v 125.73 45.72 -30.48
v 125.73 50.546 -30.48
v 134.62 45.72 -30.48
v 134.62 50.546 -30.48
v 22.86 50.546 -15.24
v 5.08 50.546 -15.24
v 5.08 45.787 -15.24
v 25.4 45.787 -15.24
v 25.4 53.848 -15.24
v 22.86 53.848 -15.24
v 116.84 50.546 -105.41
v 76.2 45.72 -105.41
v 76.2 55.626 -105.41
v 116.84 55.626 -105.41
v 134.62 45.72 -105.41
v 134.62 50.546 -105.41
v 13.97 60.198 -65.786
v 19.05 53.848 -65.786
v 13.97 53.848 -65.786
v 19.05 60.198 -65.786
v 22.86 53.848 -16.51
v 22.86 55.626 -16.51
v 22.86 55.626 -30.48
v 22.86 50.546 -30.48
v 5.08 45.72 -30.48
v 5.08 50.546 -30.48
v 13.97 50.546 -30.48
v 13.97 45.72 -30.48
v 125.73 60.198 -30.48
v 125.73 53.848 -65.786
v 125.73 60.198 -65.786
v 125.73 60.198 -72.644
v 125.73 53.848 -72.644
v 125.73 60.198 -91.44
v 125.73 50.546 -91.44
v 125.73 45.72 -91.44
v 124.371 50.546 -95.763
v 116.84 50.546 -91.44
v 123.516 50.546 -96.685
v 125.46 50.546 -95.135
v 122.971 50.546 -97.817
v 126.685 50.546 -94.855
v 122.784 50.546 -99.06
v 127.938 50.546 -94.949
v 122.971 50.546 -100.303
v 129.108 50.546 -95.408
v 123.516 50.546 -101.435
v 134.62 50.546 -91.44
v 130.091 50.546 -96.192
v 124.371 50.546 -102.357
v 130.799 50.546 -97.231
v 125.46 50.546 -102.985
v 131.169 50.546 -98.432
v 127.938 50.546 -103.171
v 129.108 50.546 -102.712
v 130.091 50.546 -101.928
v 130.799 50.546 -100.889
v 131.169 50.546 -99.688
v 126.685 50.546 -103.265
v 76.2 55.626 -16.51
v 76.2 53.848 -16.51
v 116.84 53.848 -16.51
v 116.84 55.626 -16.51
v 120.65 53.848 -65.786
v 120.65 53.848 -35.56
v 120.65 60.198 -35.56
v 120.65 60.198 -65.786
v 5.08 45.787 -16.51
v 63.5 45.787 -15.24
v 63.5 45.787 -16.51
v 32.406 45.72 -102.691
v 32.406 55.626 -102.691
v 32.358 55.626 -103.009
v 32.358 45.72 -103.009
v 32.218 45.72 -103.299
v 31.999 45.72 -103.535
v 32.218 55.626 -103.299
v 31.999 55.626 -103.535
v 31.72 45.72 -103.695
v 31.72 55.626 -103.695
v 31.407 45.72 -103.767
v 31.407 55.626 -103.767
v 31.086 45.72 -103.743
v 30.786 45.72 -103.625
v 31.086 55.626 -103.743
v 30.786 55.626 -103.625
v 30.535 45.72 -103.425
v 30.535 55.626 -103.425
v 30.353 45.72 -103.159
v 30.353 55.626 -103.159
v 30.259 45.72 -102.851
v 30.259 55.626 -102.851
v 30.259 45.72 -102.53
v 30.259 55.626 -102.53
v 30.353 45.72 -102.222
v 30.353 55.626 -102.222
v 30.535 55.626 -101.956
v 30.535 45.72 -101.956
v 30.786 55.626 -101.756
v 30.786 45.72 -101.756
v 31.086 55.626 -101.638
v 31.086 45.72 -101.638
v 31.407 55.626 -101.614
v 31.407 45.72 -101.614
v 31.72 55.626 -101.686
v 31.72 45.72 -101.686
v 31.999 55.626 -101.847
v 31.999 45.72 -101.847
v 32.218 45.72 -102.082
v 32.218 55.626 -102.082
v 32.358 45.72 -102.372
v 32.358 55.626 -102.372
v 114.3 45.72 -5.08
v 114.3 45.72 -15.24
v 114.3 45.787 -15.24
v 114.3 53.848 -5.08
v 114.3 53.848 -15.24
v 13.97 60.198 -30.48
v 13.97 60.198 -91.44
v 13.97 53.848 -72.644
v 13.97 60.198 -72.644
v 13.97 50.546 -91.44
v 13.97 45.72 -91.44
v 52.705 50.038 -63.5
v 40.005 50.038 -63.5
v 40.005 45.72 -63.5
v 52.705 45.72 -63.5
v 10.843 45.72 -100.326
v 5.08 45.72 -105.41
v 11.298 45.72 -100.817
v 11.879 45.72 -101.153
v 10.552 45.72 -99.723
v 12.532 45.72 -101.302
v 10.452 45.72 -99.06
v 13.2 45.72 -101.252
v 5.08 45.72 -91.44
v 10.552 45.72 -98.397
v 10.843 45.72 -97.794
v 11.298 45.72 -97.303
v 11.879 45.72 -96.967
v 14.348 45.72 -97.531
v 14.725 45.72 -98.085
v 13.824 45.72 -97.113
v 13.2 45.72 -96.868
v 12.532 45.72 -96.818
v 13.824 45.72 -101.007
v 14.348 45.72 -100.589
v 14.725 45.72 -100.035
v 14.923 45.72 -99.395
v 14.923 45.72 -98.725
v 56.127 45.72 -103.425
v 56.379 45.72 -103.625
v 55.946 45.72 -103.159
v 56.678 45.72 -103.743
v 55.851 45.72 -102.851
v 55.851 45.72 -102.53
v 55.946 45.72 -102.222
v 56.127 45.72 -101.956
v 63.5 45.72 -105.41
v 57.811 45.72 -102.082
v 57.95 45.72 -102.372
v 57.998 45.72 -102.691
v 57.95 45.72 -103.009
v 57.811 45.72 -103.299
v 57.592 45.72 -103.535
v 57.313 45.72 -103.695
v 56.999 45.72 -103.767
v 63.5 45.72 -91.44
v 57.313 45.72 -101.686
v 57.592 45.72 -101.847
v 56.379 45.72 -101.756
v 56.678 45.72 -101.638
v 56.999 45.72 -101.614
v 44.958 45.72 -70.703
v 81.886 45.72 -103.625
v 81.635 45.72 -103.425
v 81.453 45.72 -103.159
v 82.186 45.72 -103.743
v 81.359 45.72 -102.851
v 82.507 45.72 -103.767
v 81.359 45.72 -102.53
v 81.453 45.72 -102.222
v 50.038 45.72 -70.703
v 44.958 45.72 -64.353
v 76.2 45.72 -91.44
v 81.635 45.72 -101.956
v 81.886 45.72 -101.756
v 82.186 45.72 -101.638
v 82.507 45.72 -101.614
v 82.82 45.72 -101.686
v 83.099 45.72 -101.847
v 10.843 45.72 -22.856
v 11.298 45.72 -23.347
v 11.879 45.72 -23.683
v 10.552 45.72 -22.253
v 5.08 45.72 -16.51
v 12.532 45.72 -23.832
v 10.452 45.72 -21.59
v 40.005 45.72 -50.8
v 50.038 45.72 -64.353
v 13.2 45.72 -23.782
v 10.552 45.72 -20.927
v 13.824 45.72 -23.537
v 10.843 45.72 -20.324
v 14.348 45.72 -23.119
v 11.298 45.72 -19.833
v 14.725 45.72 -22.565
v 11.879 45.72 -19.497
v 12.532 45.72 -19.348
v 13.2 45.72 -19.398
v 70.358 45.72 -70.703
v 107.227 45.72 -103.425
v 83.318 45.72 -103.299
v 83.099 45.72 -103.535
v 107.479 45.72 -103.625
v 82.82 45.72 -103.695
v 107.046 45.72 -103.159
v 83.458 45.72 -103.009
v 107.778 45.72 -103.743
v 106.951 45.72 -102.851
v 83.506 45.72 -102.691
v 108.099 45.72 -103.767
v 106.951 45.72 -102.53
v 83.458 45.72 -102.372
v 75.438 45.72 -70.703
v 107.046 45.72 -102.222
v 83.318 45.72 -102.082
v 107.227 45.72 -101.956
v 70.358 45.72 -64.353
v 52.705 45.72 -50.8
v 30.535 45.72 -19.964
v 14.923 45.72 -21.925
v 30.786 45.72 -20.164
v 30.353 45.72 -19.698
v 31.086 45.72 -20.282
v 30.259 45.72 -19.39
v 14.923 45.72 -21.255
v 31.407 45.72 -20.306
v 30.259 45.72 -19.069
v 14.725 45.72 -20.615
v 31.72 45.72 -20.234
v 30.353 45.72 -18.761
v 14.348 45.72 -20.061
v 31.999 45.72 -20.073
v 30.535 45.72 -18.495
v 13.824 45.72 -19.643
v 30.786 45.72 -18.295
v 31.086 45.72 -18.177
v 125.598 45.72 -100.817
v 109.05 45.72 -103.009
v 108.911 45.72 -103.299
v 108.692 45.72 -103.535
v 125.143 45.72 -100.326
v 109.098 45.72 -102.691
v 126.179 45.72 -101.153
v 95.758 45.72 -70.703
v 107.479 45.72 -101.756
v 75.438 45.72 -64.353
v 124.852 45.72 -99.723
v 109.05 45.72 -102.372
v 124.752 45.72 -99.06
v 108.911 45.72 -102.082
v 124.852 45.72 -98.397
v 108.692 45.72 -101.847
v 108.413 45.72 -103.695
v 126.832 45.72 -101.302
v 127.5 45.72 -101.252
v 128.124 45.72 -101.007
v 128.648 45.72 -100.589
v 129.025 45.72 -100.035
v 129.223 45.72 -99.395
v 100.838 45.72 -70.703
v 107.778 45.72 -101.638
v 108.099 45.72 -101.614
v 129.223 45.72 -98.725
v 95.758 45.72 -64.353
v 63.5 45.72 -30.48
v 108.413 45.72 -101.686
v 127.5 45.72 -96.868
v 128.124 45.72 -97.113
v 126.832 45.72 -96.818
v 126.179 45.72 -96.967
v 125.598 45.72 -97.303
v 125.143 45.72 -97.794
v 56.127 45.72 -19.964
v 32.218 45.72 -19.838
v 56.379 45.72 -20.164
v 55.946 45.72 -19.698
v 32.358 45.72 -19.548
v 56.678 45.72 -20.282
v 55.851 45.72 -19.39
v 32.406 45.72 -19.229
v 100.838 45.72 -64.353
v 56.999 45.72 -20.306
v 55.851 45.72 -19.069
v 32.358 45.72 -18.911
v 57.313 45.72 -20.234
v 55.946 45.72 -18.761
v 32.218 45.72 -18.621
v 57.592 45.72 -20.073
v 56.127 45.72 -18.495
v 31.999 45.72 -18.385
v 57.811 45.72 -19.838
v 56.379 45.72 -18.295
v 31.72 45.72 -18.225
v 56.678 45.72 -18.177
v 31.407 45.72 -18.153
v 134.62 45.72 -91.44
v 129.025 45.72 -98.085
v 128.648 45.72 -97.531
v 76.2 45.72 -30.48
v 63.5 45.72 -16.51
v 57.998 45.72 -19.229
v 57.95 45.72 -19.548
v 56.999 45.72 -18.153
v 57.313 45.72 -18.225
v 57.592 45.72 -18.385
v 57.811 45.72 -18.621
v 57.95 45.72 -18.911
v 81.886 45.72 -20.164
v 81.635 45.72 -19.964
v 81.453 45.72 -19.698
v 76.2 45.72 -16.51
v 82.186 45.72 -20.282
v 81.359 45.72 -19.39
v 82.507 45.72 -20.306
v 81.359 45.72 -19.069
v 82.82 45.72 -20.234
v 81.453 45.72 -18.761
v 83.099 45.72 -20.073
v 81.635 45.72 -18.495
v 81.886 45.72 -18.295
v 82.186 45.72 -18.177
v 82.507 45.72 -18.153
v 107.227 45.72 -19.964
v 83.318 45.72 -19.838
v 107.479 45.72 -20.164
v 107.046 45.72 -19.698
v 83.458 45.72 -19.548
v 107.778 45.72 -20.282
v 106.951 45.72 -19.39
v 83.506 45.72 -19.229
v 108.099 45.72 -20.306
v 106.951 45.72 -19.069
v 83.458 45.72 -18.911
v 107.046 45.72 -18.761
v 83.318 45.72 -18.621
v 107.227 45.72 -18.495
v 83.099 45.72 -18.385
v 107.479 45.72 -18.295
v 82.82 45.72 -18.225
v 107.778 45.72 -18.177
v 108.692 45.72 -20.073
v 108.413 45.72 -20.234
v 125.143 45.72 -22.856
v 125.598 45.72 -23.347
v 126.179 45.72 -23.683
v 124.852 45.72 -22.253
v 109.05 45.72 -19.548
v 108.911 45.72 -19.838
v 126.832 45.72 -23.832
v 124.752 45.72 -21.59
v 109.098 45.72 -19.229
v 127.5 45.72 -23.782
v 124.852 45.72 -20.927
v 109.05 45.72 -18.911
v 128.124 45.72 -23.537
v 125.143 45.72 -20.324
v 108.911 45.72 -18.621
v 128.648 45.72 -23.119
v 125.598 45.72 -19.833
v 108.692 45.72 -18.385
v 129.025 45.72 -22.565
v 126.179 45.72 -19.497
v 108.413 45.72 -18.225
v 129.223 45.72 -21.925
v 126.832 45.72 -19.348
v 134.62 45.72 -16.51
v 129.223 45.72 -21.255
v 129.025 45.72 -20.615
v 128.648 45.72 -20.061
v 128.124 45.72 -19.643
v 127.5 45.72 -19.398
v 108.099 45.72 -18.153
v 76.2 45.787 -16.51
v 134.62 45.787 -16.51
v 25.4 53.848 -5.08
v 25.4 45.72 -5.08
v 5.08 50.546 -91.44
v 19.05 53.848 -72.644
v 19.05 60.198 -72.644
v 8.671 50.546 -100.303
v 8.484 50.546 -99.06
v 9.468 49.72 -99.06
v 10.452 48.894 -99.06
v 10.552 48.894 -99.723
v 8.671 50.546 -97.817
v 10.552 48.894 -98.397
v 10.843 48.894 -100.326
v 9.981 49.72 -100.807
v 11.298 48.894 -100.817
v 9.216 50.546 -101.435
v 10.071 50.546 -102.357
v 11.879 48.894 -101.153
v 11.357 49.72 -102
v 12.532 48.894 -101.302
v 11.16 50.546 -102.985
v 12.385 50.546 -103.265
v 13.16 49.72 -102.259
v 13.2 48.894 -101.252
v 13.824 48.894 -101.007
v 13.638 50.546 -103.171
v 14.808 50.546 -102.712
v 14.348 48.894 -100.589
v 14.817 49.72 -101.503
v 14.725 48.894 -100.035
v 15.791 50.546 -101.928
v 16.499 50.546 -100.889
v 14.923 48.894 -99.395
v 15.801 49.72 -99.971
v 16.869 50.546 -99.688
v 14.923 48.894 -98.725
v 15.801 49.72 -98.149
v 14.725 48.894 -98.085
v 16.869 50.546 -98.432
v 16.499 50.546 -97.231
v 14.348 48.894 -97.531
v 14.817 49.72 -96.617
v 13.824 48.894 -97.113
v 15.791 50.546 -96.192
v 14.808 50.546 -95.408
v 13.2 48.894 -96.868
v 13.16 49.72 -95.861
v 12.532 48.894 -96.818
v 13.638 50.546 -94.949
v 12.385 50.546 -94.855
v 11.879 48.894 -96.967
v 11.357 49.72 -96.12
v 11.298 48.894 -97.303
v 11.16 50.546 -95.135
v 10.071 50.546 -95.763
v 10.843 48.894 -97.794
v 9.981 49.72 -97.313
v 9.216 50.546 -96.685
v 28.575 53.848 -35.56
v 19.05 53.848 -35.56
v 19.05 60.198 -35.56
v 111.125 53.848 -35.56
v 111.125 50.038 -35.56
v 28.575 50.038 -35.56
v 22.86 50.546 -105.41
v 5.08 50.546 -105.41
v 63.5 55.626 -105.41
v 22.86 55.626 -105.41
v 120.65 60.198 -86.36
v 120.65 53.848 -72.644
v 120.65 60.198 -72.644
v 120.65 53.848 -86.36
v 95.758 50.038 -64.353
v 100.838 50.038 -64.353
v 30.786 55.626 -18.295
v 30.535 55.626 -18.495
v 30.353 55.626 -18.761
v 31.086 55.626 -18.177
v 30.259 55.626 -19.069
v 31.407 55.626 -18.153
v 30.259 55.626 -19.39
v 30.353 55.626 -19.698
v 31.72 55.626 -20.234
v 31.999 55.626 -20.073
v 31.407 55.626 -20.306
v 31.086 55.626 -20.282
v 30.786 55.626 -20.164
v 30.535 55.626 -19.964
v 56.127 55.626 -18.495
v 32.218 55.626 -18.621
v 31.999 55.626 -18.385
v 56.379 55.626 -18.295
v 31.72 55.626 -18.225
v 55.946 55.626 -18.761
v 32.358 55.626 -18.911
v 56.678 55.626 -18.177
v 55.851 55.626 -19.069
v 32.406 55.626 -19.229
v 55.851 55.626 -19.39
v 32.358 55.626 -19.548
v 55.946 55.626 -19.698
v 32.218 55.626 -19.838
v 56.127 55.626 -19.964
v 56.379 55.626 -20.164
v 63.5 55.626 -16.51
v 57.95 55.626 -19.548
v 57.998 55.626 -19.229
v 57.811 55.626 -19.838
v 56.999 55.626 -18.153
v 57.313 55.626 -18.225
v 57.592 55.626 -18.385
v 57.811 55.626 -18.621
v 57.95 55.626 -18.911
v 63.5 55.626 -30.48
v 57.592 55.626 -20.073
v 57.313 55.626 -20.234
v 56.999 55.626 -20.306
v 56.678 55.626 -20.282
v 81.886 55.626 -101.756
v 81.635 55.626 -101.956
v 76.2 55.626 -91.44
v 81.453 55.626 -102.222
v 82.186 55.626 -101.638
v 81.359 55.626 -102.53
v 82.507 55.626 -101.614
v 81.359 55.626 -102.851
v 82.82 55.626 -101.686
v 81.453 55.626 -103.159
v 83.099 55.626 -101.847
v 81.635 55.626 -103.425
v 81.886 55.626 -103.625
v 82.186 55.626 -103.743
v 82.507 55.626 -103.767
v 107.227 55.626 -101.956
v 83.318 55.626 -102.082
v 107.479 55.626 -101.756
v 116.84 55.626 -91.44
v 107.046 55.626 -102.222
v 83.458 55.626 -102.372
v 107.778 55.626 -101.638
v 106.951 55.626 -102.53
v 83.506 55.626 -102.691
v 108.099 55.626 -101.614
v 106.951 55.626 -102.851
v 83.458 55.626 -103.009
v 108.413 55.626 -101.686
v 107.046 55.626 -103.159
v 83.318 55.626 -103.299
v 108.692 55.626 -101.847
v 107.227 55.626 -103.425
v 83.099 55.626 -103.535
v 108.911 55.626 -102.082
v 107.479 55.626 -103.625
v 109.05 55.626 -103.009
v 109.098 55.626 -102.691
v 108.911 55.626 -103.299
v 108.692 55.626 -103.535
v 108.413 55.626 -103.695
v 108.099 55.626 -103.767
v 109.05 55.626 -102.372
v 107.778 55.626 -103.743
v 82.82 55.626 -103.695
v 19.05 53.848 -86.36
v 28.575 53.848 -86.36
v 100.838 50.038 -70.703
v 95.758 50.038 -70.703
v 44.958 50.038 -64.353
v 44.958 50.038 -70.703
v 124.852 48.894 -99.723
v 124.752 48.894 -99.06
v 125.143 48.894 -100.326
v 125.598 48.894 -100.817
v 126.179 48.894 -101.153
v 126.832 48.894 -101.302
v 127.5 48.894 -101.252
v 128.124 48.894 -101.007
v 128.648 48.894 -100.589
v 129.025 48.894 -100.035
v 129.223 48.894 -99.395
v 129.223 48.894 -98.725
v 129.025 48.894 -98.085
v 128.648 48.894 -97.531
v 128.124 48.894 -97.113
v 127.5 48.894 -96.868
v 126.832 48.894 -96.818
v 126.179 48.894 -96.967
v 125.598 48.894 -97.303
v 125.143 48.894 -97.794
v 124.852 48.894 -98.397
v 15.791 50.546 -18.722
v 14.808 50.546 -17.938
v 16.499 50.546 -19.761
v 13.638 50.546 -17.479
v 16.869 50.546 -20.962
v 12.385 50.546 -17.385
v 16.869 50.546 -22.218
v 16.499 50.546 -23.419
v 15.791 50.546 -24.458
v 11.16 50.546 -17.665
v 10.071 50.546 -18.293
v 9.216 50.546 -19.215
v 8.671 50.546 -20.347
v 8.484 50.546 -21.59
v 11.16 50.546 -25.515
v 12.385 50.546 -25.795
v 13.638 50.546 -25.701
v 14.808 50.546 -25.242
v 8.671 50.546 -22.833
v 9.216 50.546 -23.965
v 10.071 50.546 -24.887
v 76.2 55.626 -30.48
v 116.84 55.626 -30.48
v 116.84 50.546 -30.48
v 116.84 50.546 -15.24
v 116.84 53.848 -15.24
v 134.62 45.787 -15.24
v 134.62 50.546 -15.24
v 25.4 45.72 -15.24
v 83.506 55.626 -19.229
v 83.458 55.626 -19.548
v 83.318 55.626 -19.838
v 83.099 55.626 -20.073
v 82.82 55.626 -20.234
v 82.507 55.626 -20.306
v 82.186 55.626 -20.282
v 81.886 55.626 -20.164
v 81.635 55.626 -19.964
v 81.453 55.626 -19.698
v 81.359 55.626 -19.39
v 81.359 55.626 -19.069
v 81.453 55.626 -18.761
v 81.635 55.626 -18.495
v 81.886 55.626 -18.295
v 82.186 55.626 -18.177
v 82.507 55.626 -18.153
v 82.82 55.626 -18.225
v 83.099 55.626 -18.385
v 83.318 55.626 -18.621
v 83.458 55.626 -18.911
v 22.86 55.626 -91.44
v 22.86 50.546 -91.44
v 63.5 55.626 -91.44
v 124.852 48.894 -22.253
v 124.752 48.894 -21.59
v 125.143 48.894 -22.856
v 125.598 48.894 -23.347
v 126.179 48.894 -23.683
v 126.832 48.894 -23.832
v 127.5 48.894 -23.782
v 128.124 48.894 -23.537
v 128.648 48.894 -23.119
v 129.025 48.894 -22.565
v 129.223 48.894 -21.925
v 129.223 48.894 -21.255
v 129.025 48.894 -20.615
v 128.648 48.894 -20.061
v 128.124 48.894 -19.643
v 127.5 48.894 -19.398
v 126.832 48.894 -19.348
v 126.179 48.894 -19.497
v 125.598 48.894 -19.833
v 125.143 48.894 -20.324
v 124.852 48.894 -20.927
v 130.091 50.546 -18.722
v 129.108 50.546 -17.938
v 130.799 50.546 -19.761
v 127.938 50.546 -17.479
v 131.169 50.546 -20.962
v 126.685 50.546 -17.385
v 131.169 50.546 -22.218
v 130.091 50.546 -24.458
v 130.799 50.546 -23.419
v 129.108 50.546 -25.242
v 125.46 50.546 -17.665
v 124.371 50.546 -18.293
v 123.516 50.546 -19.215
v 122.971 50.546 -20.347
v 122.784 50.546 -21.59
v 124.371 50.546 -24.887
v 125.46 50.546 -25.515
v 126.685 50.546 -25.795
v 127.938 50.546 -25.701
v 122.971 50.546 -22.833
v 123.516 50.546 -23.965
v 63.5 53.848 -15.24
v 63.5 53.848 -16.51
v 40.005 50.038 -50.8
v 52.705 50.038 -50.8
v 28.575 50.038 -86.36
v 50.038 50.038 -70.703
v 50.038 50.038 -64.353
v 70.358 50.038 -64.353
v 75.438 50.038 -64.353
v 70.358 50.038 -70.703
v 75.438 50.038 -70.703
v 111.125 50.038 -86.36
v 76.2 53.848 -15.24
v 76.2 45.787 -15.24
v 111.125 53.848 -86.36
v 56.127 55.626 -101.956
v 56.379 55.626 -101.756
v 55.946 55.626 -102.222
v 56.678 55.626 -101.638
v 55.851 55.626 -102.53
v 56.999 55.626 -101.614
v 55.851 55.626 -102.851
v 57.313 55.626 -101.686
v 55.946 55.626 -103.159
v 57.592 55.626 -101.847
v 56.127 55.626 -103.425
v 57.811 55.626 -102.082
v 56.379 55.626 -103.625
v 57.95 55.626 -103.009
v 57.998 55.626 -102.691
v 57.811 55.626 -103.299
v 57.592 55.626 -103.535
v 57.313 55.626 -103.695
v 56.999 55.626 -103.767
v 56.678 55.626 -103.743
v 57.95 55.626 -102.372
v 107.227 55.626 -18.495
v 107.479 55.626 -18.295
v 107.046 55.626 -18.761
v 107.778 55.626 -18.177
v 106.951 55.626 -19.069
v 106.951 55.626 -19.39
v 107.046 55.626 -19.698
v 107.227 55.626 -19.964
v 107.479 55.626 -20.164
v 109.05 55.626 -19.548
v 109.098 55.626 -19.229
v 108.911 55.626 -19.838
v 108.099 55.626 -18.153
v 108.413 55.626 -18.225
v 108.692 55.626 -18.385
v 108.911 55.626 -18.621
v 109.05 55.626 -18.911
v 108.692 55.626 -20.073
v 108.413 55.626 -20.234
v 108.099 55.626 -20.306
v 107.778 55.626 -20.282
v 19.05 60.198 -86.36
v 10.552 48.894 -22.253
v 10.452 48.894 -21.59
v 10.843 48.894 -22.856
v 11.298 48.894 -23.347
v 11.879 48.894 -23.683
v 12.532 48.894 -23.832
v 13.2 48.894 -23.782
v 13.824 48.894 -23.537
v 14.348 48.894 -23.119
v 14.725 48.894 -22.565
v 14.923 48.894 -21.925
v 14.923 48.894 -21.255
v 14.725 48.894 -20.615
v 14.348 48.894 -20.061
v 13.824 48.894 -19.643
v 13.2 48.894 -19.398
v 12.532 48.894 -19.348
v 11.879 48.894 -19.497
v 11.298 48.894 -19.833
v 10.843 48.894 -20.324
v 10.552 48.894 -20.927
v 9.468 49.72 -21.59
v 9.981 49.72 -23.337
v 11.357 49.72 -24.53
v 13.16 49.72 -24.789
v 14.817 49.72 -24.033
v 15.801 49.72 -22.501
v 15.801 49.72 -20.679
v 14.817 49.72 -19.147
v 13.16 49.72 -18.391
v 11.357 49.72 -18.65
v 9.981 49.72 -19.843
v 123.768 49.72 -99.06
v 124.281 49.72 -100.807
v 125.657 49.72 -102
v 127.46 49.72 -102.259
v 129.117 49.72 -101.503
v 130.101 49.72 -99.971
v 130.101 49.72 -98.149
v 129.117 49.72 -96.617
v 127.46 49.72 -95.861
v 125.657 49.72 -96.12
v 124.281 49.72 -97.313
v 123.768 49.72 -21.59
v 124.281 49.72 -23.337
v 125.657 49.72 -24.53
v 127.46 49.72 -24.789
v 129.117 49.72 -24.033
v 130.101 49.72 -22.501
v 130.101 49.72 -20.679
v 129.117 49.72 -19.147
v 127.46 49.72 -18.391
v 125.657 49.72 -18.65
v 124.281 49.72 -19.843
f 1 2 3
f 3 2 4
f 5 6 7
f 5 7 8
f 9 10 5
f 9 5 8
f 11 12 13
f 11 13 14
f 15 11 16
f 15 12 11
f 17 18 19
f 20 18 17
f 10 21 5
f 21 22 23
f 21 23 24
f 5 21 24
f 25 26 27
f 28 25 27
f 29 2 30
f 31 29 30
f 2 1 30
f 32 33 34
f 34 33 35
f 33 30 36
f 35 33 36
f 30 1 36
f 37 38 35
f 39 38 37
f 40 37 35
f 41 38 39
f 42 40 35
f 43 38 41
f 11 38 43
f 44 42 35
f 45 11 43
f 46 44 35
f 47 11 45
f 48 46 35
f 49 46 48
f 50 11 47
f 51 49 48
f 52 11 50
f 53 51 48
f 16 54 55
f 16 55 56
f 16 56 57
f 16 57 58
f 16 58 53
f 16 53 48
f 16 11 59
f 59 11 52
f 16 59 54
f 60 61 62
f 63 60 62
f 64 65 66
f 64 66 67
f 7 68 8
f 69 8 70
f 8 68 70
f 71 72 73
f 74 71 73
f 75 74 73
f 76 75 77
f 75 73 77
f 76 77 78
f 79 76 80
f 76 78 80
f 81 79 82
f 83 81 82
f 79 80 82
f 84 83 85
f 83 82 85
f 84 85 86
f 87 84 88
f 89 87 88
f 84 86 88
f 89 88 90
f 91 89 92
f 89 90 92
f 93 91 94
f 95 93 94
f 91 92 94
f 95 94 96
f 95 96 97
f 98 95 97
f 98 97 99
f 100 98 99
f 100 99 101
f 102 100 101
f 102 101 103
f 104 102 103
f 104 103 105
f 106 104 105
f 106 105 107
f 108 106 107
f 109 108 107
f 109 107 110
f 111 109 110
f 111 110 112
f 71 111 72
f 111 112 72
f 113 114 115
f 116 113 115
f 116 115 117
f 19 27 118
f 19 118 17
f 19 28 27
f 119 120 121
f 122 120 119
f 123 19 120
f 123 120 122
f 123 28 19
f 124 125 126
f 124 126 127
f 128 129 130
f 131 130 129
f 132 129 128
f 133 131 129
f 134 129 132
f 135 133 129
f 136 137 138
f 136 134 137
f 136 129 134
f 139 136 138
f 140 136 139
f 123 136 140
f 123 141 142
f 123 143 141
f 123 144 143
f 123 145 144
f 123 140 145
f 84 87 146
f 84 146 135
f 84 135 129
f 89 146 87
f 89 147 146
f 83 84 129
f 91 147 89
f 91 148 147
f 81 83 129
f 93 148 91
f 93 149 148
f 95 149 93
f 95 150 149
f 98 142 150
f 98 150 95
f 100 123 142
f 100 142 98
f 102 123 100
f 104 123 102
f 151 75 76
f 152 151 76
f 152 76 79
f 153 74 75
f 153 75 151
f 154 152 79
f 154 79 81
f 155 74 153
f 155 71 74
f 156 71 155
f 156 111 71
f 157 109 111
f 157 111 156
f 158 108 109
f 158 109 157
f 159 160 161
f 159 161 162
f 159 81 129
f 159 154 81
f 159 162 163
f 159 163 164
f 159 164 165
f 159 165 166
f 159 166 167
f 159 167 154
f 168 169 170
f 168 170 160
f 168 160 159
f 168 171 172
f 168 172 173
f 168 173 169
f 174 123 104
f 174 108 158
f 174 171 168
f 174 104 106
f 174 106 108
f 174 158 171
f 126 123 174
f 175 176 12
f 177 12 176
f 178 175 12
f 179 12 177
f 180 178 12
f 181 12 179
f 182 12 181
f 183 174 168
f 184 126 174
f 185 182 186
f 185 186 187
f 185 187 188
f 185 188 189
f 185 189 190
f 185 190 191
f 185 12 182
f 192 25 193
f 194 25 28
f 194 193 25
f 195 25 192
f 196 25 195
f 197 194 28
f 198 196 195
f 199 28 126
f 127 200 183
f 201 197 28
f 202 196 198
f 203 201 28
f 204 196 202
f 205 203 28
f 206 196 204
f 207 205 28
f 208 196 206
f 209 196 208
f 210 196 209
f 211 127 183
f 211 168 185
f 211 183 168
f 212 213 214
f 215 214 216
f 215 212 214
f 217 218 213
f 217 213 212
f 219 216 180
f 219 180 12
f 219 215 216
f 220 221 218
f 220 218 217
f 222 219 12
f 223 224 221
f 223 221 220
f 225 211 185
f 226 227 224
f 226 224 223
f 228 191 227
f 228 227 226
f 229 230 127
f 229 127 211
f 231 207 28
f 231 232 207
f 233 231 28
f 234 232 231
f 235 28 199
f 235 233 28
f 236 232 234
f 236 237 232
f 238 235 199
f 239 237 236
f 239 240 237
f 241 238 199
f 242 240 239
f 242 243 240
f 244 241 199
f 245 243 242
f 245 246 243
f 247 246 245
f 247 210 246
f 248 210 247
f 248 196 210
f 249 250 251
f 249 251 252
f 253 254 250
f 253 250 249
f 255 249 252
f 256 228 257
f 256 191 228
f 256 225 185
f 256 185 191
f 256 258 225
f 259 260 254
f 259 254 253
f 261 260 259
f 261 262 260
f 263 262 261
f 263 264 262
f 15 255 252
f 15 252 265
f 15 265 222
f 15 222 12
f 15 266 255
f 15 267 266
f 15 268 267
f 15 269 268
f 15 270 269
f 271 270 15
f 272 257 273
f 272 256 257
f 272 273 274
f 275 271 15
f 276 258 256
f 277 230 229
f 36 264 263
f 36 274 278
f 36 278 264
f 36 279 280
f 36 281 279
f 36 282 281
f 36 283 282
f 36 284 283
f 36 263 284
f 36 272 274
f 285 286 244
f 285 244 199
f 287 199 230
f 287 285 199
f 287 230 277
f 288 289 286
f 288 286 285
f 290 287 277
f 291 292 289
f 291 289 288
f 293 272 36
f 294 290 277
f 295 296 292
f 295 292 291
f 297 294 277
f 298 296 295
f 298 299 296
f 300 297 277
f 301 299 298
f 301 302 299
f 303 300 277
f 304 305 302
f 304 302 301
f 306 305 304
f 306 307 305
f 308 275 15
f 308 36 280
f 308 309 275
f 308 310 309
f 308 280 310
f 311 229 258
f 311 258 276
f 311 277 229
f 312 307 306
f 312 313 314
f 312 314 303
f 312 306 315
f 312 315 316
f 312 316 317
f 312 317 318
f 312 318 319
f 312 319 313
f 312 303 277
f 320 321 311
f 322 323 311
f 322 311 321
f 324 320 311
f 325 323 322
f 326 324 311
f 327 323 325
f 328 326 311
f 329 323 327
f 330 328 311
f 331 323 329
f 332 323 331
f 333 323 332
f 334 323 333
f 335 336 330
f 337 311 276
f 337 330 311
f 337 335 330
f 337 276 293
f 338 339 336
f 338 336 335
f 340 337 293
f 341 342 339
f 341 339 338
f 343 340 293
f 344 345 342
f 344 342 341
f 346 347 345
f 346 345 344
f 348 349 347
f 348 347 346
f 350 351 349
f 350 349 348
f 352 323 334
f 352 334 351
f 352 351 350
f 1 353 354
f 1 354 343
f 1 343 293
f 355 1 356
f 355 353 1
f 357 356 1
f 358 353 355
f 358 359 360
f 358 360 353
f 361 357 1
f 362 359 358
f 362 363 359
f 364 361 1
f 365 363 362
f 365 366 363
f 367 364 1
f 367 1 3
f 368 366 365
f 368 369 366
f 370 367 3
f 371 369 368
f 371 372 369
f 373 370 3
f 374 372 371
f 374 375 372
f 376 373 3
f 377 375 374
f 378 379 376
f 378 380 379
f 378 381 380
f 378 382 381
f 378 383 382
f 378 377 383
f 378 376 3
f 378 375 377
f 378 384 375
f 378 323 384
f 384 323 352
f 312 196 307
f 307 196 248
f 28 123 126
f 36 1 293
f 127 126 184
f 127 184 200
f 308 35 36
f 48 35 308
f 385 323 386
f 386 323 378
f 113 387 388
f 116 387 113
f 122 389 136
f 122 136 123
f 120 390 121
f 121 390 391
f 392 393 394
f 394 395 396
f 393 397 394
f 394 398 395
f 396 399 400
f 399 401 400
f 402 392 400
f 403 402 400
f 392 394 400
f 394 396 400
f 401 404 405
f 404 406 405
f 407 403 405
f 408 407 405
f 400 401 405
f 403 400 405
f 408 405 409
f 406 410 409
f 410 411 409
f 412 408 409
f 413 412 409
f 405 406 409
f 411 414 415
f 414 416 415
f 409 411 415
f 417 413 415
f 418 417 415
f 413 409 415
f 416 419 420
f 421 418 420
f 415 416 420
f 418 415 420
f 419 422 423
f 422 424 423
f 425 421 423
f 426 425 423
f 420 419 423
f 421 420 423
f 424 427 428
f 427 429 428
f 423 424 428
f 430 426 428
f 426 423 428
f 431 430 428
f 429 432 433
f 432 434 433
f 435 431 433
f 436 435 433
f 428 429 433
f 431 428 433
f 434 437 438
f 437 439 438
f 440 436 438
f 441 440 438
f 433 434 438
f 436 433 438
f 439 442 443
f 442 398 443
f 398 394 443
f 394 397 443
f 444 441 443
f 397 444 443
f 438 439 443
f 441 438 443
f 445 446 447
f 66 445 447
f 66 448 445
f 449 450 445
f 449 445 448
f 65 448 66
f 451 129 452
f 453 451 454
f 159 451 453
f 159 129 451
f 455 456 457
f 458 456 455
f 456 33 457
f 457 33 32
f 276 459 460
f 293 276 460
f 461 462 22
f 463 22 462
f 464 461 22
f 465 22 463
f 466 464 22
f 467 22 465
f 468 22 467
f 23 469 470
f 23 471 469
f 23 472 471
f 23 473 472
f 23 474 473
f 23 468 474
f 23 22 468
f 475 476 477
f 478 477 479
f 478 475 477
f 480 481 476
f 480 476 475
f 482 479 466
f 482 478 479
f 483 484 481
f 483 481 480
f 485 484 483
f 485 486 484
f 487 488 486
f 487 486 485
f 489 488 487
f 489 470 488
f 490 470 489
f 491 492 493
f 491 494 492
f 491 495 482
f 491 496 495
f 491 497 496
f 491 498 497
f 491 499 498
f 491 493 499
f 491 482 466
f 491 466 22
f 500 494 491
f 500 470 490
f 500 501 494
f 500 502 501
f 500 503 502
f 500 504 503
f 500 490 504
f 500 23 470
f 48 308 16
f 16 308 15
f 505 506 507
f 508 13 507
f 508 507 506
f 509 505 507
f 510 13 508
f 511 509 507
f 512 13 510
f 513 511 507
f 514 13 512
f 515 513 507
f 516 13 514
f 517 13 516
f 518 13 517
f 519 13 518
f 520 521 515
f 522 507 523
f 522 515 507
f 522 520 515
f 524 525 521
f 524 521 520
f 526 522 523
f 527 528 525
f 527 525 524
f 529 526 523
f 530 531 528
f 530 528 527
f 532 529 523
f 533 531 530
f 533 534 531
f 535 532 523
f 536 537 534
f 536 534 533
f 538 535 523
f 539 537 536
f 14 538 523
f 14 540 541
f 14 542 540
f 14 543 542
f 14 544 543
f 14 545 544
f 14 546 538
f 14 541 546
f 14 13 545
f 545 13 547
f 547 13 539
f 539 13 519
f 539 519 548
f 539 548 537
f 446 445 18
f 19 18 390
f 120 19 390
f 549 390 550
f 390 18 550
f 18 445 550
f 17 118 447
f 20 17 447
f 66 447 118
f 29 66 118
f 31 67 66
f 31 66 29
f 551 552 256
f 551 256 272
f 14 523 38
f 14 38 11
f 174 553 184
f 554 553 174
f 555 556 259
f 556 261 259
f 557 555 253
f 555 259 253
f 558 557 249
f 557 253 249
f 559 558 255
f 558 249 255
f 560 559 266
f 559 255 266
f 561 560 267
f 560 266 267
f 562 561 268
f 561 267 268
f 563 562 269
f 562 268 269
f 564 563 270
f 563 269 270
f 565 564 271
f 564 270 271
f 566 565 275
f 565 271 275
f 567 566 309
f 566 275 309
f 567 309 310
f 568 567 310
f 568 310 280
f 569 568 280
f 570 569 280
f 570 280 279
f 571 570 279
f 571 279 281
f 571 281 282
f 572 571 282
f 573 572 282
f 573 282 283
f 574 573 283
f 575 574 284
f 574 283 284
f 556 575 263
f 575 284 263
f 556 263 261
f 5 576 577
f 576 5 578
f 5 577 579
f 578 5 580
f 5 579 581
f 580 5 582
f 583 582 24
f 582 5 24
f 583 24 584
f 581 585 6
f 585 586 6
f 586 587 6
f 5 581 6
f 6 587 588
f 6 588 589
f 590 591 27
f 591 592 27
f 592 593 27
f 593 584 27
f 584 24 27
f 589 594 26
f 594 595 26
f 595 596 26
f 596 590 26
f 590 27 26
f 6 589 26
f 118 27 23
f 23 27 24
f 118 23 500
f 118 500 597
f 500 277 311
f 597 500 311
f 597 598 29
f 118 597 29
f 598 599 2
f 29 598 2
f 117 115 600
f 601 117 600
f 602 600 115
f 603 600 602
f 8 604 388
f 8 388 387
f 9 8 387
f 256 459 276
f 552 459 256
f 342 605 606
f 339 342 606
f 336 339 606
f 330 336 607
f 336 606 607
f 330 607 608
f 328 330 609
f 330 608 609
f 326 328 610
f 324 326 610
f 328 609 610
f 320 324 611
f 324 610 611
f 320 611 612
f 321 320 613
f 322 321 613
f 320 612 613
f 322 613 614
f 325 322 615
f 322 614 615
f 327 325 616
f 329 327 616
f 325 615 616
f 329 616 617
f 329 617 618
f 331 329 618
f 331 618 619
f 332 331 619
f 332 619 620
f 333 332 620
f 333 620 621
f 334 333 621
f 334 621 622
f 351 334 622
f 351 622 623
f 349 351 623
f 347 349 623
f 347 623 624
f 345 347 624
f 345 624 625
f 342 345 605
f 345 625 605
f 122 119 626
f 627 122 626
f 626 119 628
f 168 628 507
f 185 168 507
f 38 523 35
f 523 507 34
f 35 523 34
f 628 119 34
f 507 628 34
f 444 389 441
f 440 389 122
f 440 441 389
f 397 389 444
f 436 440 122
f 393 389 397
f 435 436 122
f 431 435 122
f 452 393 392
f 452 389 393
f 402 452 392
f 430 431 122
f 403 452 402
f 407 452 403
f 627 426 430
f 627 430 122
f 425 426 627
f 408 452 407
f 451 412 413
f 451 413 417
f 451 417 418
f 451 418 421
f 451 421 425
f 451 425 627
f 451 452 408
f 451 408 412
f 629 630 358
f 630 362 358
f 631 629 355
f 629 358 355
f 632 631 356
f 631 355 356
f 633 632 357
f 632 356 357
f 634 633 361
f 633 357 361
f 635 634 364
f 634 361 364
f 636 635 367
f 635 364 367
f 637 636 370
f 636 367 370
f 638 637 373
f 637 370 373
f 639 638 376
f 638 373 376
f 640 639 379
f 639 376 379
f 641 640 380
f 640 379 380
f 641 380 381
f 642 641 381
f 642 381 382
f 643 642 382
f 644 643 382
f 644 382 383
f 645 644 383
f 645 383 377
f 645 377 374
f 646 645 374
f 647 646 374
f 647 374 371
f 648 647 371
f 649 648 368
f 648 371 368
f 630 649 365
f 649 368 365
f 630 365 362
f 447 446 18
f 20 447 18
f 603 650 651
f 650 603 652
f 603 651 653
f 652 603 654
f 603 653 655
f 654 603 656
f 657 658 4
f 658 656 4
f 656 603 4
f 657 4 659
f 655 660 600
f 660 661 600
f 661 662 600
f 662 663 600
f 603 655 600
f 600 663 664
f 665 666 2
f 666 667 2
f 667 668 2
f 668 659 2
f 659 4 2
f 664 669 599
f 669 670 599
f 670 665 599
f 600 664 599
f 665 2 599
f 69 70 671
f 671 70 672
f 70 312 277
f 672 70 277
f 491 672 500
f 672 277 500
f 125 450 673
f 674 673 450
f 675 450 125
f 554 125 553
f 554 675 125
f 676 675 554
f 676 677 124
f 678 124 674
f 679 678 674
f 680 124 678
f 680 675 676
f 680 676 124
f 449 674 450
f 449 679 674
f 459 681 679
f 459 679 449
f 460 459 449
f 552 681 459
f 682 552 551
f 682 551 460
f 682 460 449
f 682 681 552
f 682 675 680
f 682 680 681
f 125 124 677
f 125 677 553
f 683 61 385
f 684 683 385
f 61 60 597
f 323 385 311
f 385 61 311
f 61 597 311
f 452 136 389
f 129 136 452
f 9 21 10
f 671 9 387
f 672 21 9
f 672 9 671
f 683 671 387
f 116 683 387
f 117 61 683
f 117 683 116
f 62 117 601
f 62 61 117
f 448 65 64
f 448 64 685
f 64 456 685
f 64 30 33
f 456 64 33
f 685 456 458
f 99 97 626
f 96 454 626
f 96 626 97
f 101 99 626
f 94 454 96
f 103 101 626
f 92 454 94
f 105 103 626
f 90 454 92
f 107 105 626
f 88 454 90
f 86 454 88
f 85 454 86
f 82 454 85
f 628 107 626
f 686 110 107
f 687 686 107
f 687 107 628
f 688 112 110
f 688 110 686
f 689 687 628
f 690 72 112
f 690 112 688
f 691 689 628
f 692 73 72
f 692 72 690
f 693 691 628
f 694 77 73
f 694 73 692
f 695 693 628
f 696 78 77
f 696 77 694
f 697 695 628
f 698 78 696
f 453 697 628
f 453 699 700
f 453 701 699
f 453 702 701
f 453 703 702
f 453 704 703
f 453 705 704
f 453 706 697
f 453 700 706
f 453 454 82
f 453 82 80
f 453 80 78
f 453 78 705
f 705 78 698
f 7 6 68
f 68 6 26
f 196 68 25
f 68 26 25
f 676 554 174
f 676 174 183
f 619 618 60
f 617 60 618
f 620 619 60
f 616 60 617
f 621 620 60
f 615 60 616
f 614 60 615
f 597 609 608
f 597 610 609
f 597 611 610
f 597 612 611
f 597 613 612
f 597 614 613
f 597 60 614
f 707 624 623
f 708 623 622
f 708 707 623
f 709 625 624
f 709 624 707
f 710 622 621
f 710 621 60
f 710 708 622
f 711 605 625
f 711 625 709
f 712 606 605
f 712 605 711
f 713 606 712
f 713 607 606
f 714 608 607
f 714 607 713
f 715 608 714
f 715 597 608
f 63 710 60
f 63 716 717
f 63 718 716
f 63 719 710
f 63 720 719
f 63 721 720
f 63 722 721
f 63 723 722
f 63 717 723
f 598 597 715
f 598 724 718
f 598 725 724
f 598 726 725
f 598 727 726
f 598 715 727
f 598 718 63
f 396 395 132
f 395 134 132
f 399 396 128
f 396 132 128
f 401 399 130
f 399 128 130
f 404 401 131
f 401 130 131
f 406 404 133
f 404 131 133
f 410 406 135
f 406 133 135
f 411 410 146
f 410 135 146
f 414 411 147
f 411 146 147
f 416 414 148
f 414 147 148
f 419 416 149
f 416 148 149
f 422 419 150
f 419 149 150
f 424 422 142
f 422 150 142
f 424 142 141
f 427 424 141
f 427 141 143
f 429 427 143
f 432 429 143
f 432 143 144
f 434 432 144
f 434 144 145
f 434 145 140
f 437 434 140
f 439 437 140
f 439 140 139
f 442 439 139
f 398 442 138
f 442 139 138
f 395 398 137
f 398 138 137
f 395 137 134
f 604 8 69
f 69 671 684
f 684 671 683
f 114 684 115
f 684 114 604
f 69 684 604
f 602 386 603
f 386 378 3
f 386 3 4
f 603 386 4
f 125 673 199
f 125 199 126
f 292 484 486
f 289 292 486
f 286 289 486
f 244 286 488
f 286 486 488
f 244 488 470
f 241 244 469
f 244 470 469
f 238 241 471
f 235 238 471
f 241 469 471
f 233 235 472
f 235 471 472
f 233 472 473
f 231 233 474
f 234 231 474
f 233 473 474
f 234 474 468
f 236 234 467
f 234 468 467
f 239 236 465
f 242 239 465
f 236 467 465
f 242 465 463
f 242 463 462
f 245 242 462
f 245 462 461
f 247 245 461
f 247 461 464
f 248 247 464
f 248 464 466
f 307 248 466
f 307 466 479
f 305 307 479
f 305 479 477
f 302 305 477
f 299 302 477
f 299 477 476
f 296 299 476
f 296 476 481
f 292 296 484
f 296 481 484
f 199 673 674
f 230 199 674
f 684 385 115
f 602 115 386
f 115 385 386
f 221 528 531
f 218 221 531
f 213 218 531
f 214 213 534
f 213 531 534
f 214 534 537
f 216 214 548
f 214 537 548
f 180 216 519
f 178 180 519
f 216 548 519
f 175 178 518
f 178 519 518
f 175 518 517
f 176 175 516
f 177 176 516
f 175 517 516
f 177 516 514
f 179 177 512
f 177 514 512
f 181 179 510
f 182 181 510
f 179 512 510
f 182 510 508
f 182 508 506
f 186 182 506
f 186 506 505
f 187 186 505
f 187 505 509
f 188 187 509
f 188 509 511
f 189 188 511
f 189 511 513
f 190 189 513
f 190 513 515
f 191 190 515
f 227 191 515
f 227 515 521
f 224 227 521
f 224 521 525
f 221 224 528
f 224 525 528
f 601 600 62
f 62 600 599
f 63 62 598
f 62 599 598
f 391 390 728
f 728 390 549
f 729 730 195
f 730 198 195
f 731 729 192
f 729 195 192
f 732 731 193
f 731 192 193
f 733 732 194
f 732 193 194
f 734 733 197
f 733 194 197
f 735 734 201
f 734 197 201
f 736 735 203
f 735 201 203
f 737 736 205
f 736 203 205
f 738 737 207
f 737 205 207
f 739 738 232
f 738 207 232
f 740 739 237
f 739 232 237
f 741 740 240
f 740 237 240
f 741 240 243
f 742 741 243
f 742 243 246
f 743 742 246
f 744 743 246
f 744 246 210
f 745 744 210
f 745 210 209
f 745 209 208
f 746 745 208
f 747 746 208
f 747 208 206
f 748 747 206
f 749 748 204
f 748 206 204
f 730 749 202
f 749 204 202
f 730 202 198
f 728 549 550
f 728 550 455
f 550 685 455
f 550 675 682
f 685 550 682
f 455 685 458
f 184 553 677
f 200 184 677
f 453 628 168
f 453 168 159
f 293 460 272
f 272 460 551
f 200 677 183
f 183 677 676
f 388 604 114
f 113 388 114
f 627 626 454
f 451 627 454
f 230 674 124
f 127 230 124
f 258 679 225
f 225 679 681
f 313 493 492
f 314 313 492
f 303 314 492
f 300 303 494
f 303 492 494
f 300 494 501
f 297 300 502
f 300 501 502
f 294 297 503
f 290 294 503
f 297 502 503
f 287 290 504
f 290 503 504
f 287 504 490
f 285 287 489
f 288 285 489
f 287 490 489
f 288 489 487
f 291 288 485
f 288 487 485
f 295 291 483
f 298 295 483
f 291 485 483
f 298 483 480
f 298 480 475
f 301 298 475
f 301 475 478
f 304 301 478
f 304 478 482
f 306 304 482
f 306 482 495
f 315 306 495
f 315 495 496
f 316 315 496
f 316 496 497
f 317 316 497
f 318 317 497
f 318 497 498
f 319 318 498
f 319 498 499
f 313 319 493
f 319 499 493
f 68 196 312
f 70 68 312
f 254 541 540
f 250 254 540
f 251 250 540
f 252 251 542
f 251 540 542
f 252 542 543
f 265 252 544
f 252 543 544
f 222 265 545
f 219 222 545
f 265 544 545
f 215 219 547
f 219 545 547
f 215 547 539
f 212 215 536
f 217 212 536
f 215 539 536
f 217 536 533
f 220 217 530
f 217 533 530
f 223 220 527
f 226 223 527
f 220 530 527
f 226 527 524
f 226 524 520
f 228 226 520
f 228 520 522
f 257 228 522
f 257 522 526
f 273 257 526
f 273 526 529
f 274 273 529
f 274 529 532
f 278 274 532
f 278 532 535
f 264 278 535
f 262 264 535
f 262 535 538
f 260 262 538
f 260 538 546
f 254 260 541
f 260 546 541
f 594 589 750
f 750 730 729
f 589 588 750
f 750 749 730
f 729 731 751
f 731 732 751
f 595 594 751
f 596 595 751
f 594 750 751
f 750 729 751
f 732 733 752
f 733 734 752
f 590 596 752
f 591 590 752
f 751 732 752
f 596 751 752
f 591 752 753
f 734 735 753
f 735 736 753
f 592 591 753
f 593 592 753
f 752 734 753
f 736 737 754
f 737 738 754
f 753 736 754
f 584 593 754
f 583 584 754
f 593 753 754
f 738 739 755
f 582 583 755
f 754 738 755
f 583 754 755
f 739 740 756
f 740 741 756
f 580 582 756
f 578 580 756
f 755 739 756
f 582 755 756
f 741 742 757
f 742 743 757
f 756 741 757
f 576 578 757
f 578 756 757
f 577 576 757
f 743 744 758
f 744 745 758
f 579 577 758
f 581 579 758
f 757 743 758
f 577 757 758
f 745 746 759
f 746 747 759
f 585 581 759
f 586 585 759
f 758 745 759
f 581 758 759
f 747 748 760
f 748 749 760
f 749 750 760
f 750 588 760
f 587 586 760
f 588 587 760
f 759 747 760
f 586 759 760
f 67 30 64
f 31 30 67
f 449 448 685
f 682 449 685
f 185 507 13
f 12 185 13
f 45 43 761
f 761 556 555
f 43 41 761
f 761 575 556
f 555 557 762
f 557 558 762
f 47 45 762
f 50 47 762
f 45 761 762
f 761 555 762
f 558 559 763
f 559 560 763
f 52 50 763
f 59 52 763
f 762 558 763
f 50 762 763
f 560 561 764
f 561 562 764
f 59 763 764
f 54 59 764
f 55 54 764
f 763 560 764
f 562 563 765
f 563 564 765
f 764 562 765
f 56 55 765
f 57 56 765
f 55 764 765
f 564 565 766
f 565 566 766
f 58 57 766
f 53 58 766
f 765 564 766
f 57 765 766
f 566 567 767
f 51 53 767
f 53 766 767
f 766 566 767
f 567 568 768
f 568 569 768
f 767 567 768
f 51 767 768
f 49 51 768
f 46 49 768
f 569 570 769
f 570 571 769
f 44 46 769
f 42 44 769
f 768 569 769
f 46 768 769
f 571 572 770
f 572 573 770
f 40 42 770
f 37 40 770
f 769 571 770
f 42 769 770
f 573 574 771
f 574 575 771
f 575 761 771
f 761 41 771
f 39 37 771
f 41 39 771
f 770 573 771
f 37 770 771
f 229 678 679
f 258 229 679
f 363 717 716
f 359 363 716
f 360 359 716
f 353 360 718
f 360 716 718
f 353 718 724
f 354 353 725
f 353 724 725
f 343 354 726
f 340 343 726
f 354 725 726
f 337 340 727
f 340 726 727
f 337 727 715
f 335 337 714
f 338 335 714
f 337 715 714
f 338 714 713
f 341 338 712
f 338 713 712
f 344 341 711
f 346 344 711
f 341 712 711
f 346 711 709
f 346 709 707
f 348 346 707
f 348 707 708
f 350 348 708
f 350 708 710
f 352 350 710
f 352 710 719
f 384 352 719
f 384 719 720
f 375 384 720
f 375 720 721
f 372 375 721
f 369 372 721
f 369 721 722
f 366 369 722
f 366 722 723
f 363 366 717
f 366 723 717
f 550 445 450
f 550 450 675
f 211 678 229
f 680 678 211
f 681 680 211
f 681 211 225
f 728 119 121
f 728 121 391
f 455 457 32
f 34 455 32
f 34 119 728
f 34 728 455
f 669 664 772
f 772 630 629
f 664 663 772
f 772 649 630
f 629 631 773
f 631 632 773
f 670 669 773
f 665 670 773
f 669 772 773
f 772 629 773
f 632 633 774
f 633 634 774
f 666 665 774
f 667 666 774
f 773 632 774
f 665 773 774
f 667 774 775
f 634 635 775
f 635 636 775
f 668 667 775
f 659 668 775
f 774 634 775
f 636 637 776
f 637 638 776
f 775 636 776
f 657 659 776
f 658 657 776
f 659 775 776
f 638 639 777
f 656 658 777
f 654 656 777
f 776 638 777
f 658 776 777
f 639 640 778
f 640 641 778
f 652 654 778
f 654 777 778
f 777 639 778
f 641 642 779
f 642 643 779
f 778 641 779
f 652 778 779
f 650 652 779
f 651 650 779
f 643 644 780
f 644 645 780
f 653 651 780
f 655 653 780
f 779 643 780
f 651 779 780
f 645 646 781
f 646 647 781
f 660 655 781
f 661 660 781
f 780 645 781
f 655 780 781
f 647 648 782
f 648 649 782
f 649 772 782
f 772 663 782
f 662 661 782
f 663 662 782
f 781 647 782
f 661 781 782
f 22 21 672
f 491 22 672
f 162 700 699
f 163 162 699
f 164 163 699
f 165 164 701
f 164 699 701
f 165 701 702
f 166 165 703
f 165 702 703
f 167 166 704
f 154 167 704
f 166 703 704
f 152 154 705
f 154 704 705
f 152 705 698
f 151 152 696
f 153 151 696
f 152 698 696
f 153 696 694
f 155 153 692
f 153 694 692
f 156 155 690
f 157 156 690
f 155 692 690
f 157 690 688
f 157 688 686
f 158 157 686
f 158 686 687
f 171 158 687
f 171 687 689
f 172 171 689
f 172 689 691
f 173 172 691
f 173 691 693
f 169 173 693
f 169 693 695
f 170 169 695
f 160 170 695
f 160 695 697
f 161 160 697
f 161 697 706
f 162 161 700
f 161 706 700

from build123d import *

# Parameters (mm, degrees)
SKETCH5_W                                         = 129.54
SKETCH5_H                                         = 88.9
BUTTON_SUPPORT_DEPTH                              = 48.768
SKETCH6_W                                         = 111.76
SKETCH6_H                                         = 60.96
SKETCH6_W_2                                       = 101.6
SKETCH6_H_2                                       = 50.8
BOSS_EXTRUDE4_DEPTH                               = 6.35
SKETCH7_W                                         = 82.55
SKETCH7_H                                         = 50.8
FORCE_SENSOR_CUTOUT_DEPTH                         = 3.81
SKETCH4_W                                         = 129.54
SKETCH4_H                                         = 40.64
BOTTOM_CUT_DEPTH                                  = 139.7
SKETCH25_W                                        = 111.76
SKETCH25_H                                        = 13.97
NEOPIXEL_LIFT_DEPTH                               = 1.778
SKETCH8_W                                         = 5.08
SKETCH8_H                                         = 6.35
HAPTIC_WIRE_HOLES_DEPTH                           = 4.318
SKETCH9_W                                         = 12.7
SKETCH9_H                                         = 12.7
FORCE_SENSOR_HOLE_DEPTH                           = 4.318
SKETCH10_R                                        = 1.0795
NEOPIXEL_HOLES_DEPTH                              = 9.906
NEOPIXEL_WIRE_SIDE_HOLES_REACH                    = 10.128
SKETCH18_W                                        = 8.89
SKETCH18_H                                        = 60.96
SKETCH19_W                                        = 12.7
SKETCH19_H                                        = 13.97
SKETCH19_W_2                                      = 17.78
NEOPIXEL_SOLDER_GAP_DEPTH                         = 5.08
BOSS_EXTRUDE6_DEPTH                               = 1.27
SKETCH11_W                                        = 88.9
SKETCH11_H                                        = 8.128
BOSS_EXTRUDE5_DEPTH                               = 10.16
CSK_FOR_8_FLAT_HEAD_MACHINE_SCREW_100_D           = 4.4958
CSK_FOR_8_FLAT_HEAD_MACHINE_SCREW_100_CSINK_D     = 8.4328
CSK_FOR_8_FLAT_HEAD_MACHINE_SCREW_100_CSINK_ANGLE = 100
SKETCH23_W                                        = 12.7
SKETCH23_H                                        = 13.97
SKETCH23_H_2                                      = 15.24
CUT_EXTRUDE1_DEPTH                                = 5.826
SKETCH24_W                                        = 6.858
SKETCH24_H                                        = 6.35
CUT_EXTRUDE2_DEPTH                                = 121.65


with BuildPart() as part:
    # Sketch5 → Button Support (new body)
    with BuildSketch(Plane(origin=(0, 5.08, 0), x_dir=(1, 0, 0), z_dir=(0, 1, 0))):
        with Locations((69.85, 60.96)):
            Rectangle(SKETCH5_W, SKETCH5_H)
    extrude(amount=BUTTON_SUPPORT_DEPTH)

    # Sketch6 → Boss-Extrude4 (add)
    with BuildSketch(Plane(origin=(0, 53.848, 0), x_dir=(1, 0, 0), z_dir=(0, 1, 0))):
        with Locations((69.85, 60.96)):
            Rectangle(SKETCH6_W, SKETCH6_H)
        with Locations((69.85, 60.96)):
            Rectangle(SKETCH6_W_2, SKETCH6_H_2, mode=Mode.SUBTRACT)
    extrude(amount=BOSS_EXTRUDE4_DEPTH)

    # Sketch7 → Force Sensor Cutout (cut)
    with BuildSketch(Plane(origin=(0, 53.848, 0), x_dir=(1, 0, 0), z_dir=(0, 1, 0))):
        with Locations((69.85, 60.96)):
            Rectangle(SKETCH7_W, SKETCH7_H)
    extrude(amount=-FORCE_SENSOR_CUTOUT_DEPTH, mode=Mode.SUBTRACT)

    # Sketch4 → Bottom Cut (cut)
    with BuildSketch(Plane.XY):
        with Locations((69.85, 25.4)):
            Rectangle(SKETCH4_W, SKETCH4_H)
    extrude(amount=-BOTTOM_CUT_DEPTH, mode=Mode.SUBTRACT)

    # Sketch25 → NeoPixel Lift (add)
    with BuildSketch(Plane(origin=(0, 53.848, 0), x_dir=(1, 0, 0), z_dir=(0, 1, 0))):
        with Locations((69.85, 98.425)):
            Rectangle(SKETCH25_W, SKETCH25_H)
        with Locations((69.85, 23.495)):
            Rectangle(SKETCH25_W, SKETCH25_H)
    extrude(amount=NEOPIXEL_LIFT_DEPTH)

    # Sketch8 → Haptic Wire Holes (cut)
    with BuildSketch(Plane(origin=(0, 50.038, 0), x_dir=(1, 0, 0), z_dir=(0, 1, 0))):
        with Locations((72.898, 67.528002358)):
            Rectangle(SKETCH8_W, SKETCH8_H)
        with Locations((98.298, 67.528002358)):
            Rectangle(SKETCH8_W, SKETCH8_H)
        with Locations((47.498, 67.528002358)):
            Rectangle(SKETCH8_W, SKETCH8_H)
    extrude(amount=-HAPTIC_WIRE_HOLES_DEPTH, mode=Mode.SUBTRACT)

    # Sketch9 → Force Sensor Hole (cut)
    with BuildSketch(Plane(origin=(0, 50.038, 0), x_dir=(1, 0, 0), z_dir=(0, 1, 0))):
        with Locations((46.355, 57.15)):
            Rectangle(SKETCH9_W, SKETCH9_H)
    extrude(amount=-FORCE_SENSOR_HOLE_DEPTH, mode=Mode.SUBTRACT)

    # Sketch10 → NeoPixel Holes (cut)
    with BuildSketch(Plane(origin=(0, 55.626, 0), x_dir=(1, 0, 0), z_dir=(0, 1, 0))):
        with Locations((108.018583302, 19.2294764)):
            Circle(SKETCH10_R)
        with Locations((82.42609372, 19.2294764)):
            Circle(SKETCH10_R)
        with Locations((56.918583394, 19.2294764)):
            Circle(SKETCH10_R)
        with Locations((31.326093812, 19.2294764)):
            Circle(SKETCH10_R)
        with Locations((31.326093812, 102.6905236)):
            Circle(SKETCH10_R)
        with Locations((56.918583394, 102.6905236)):
            Circle(SKETCH10_R)
        with Locations((82.42609372, 102.6905236)):
            Circle(SKETCH10_R)
        with Locations((108.018583302, 102.6905236)):
            Circle(SKETCH10_R)
    extrude(amount=-NEOPIXEL_HOLES_DEPTH, mode=Mode.SUBTRACT)

    # Sketch18 → Neopixel Wire Side Holes (cut, up to next)
    with BuildSketch(Plane(origin=(0, 53.848, 0), x_dir=(1, 0, 0), z_dir=(0, 1, 0)), mode=Mode.PRIVATE) as neopixel_wire_side_holes_sk1:
        with Locations((130.175, 60.96)):
            Rectangle(SKETCH18_W, SKETCH18_H)
    neopixel_wire_side_holes_tool1 = extrude(neopixel_wire_side_holes_sk1.sketch, amount=-NEOPIXEL_WIRE_SIDE_HOLES_REACH, mode=Mode.PRIVATE) & part.part
    add(neopixel_wire_side_holes_tool1.solids().sort_by_distance((130.175, 53.848, -60.96))[0], mode=Mode.SUBTRACT)
    # Sketch18 → Neopixel Wire Side Holes (cut, up to next)
    with BuildSketch(Plane(origin=(0, 53.848, 0), x_dir=(1, 0, 0), z_dir=(0, 1, 0)), mode=Mode.PRIVATE) as neopixel_wire_side_holes_sk2:
        with Locations((9.525, 60.96)):
            Rectangle(SKETCH18_W, SKETCH18_H)
    neopixel_wire_side_holes_tool2 = extrude(neopixel_wire_side_holes_sk2.sketch, amount=-NEOPIXEL_WIRE_SIDE_HOLES_REACH, mode=Mode.PRIVATE) & part.part
    add(neopixel_wire_side_holes_tool2.solids().sort_by_distance((9.525, 53.848, -60.96))[0], mode=Mode.SUBTRACT)

    # Sketch19 → NeoPixel solder gap (cut)
    with BuildSketch(Plane(origin=(0, 55.626, 0), x_dir=(1, 0, 0), z_dir=(0, 1, 0))):
        with Locations((69.85, 98.425)):
            Rectangle(SKETCH19_W, SKETCH19_H)
        with Locations((13.97, 98.425)):
            Rectangle(SKETCH19_W_2, SKETCH19_H)
        with Locations((125.73, 98.425)):
            Rectangle(SKETCH19_W_2, SKETCH19_H)
    neopixel_solder_gap = extrude(amount=-NEOPIXEL_SOLDER_GAP_DEPTH, mode=Mode.SUBTRACT)

    # Mirror1: NeoPixel solder gap across plane
    add(neopixel_solder_gap.mirror(Plane.XY.offset(-60.96)), mode=Mode.SUBTRACT)

    # Sketch20 → Boss-Extrude6 (add)
    with BuildSketch(Plane.XY.offset(-16.51)):
        Polygon((22.86, 50.546), (5.08, 50.546), (5.08, 45.786808958), (134.62, 45.786808958), (134.62, 50.546), (116.84, 50.546), (116.84, 53.848), (76.2, 53.848), (76.2, 50.546), (63.5, 50.546), (63.5, 53.848), (22.86, 53.848), align=None)
    extrude(amount=BOSS_EXTRUDE6_DEPTH)

    # Sketch11 → Boss-Extrude5 (add)
    with BuildSketch(Plane.XY.offset(-15.24)):
        with Locations((69.85, 49.784)):
            Rectangle(SKETCH11_W, SKETCH11_H)
    extrude(amount=BOSS_EXTRUDE5_DEPTH)

    # CSK for #8 Flat Head Machine Screw (100)1 (through all)
    with Locations(Plane(origin=(0, 50.546, 0), x_dir=(1, 0, 0), z_dir=(0, 1, 0))):
        with Locations((12.7, 99.06), (127, 99.06), (127, 21.59), (12.7, 21.59)):
            CounterSinkHole(CSK_FOR_8_FLAT_HEAD_MACHINE_SCREW_100_D / 2, CSK_FOR_8_FLAT_HEAD_MACHINE_SCREW_100_CSINK_D / 2, counter_sink_angle=CSK_FOR_8_FLAT_HEAD_MACHINE_SCREW_100_CSINK_ANGLE)

    # Sketch23 → Cut-Extrude1 (cut, through all)
    with BuildSketch(Plane(origin=(0, 50.546, 0), x_dir=(1, 0, 0), z_dir=(0, 1, 0))):
        with Locations((69.85, 98.425)):
            Rectangle(SKETCH23_W, SKETCH23_H)
        with Locations((69.85, 22.86)):
            Rectangle(SKETCH23_W, SKETCH23_H_2)
    extrude(amount=-CUT_EXTRUDE1_DEPTH, mode=Mode.SUBTRACT)

    # Sketch24 → Cut-Extrude2 (cut, through all)
    with BuildSketch(Plane(origin=(125.73, 0, 0), x_dir=(0, 0, -1), z_dir=(1, 0, 0))):
        with Locations((69.215, 57.023)):
            Rectangle(SKETCH24_W, SKETCH24_H)
    extrude(amount=-CUT_EXTRUDE2_DEPTH, mode=Mode.SUBTRACT)


solid = part.part
